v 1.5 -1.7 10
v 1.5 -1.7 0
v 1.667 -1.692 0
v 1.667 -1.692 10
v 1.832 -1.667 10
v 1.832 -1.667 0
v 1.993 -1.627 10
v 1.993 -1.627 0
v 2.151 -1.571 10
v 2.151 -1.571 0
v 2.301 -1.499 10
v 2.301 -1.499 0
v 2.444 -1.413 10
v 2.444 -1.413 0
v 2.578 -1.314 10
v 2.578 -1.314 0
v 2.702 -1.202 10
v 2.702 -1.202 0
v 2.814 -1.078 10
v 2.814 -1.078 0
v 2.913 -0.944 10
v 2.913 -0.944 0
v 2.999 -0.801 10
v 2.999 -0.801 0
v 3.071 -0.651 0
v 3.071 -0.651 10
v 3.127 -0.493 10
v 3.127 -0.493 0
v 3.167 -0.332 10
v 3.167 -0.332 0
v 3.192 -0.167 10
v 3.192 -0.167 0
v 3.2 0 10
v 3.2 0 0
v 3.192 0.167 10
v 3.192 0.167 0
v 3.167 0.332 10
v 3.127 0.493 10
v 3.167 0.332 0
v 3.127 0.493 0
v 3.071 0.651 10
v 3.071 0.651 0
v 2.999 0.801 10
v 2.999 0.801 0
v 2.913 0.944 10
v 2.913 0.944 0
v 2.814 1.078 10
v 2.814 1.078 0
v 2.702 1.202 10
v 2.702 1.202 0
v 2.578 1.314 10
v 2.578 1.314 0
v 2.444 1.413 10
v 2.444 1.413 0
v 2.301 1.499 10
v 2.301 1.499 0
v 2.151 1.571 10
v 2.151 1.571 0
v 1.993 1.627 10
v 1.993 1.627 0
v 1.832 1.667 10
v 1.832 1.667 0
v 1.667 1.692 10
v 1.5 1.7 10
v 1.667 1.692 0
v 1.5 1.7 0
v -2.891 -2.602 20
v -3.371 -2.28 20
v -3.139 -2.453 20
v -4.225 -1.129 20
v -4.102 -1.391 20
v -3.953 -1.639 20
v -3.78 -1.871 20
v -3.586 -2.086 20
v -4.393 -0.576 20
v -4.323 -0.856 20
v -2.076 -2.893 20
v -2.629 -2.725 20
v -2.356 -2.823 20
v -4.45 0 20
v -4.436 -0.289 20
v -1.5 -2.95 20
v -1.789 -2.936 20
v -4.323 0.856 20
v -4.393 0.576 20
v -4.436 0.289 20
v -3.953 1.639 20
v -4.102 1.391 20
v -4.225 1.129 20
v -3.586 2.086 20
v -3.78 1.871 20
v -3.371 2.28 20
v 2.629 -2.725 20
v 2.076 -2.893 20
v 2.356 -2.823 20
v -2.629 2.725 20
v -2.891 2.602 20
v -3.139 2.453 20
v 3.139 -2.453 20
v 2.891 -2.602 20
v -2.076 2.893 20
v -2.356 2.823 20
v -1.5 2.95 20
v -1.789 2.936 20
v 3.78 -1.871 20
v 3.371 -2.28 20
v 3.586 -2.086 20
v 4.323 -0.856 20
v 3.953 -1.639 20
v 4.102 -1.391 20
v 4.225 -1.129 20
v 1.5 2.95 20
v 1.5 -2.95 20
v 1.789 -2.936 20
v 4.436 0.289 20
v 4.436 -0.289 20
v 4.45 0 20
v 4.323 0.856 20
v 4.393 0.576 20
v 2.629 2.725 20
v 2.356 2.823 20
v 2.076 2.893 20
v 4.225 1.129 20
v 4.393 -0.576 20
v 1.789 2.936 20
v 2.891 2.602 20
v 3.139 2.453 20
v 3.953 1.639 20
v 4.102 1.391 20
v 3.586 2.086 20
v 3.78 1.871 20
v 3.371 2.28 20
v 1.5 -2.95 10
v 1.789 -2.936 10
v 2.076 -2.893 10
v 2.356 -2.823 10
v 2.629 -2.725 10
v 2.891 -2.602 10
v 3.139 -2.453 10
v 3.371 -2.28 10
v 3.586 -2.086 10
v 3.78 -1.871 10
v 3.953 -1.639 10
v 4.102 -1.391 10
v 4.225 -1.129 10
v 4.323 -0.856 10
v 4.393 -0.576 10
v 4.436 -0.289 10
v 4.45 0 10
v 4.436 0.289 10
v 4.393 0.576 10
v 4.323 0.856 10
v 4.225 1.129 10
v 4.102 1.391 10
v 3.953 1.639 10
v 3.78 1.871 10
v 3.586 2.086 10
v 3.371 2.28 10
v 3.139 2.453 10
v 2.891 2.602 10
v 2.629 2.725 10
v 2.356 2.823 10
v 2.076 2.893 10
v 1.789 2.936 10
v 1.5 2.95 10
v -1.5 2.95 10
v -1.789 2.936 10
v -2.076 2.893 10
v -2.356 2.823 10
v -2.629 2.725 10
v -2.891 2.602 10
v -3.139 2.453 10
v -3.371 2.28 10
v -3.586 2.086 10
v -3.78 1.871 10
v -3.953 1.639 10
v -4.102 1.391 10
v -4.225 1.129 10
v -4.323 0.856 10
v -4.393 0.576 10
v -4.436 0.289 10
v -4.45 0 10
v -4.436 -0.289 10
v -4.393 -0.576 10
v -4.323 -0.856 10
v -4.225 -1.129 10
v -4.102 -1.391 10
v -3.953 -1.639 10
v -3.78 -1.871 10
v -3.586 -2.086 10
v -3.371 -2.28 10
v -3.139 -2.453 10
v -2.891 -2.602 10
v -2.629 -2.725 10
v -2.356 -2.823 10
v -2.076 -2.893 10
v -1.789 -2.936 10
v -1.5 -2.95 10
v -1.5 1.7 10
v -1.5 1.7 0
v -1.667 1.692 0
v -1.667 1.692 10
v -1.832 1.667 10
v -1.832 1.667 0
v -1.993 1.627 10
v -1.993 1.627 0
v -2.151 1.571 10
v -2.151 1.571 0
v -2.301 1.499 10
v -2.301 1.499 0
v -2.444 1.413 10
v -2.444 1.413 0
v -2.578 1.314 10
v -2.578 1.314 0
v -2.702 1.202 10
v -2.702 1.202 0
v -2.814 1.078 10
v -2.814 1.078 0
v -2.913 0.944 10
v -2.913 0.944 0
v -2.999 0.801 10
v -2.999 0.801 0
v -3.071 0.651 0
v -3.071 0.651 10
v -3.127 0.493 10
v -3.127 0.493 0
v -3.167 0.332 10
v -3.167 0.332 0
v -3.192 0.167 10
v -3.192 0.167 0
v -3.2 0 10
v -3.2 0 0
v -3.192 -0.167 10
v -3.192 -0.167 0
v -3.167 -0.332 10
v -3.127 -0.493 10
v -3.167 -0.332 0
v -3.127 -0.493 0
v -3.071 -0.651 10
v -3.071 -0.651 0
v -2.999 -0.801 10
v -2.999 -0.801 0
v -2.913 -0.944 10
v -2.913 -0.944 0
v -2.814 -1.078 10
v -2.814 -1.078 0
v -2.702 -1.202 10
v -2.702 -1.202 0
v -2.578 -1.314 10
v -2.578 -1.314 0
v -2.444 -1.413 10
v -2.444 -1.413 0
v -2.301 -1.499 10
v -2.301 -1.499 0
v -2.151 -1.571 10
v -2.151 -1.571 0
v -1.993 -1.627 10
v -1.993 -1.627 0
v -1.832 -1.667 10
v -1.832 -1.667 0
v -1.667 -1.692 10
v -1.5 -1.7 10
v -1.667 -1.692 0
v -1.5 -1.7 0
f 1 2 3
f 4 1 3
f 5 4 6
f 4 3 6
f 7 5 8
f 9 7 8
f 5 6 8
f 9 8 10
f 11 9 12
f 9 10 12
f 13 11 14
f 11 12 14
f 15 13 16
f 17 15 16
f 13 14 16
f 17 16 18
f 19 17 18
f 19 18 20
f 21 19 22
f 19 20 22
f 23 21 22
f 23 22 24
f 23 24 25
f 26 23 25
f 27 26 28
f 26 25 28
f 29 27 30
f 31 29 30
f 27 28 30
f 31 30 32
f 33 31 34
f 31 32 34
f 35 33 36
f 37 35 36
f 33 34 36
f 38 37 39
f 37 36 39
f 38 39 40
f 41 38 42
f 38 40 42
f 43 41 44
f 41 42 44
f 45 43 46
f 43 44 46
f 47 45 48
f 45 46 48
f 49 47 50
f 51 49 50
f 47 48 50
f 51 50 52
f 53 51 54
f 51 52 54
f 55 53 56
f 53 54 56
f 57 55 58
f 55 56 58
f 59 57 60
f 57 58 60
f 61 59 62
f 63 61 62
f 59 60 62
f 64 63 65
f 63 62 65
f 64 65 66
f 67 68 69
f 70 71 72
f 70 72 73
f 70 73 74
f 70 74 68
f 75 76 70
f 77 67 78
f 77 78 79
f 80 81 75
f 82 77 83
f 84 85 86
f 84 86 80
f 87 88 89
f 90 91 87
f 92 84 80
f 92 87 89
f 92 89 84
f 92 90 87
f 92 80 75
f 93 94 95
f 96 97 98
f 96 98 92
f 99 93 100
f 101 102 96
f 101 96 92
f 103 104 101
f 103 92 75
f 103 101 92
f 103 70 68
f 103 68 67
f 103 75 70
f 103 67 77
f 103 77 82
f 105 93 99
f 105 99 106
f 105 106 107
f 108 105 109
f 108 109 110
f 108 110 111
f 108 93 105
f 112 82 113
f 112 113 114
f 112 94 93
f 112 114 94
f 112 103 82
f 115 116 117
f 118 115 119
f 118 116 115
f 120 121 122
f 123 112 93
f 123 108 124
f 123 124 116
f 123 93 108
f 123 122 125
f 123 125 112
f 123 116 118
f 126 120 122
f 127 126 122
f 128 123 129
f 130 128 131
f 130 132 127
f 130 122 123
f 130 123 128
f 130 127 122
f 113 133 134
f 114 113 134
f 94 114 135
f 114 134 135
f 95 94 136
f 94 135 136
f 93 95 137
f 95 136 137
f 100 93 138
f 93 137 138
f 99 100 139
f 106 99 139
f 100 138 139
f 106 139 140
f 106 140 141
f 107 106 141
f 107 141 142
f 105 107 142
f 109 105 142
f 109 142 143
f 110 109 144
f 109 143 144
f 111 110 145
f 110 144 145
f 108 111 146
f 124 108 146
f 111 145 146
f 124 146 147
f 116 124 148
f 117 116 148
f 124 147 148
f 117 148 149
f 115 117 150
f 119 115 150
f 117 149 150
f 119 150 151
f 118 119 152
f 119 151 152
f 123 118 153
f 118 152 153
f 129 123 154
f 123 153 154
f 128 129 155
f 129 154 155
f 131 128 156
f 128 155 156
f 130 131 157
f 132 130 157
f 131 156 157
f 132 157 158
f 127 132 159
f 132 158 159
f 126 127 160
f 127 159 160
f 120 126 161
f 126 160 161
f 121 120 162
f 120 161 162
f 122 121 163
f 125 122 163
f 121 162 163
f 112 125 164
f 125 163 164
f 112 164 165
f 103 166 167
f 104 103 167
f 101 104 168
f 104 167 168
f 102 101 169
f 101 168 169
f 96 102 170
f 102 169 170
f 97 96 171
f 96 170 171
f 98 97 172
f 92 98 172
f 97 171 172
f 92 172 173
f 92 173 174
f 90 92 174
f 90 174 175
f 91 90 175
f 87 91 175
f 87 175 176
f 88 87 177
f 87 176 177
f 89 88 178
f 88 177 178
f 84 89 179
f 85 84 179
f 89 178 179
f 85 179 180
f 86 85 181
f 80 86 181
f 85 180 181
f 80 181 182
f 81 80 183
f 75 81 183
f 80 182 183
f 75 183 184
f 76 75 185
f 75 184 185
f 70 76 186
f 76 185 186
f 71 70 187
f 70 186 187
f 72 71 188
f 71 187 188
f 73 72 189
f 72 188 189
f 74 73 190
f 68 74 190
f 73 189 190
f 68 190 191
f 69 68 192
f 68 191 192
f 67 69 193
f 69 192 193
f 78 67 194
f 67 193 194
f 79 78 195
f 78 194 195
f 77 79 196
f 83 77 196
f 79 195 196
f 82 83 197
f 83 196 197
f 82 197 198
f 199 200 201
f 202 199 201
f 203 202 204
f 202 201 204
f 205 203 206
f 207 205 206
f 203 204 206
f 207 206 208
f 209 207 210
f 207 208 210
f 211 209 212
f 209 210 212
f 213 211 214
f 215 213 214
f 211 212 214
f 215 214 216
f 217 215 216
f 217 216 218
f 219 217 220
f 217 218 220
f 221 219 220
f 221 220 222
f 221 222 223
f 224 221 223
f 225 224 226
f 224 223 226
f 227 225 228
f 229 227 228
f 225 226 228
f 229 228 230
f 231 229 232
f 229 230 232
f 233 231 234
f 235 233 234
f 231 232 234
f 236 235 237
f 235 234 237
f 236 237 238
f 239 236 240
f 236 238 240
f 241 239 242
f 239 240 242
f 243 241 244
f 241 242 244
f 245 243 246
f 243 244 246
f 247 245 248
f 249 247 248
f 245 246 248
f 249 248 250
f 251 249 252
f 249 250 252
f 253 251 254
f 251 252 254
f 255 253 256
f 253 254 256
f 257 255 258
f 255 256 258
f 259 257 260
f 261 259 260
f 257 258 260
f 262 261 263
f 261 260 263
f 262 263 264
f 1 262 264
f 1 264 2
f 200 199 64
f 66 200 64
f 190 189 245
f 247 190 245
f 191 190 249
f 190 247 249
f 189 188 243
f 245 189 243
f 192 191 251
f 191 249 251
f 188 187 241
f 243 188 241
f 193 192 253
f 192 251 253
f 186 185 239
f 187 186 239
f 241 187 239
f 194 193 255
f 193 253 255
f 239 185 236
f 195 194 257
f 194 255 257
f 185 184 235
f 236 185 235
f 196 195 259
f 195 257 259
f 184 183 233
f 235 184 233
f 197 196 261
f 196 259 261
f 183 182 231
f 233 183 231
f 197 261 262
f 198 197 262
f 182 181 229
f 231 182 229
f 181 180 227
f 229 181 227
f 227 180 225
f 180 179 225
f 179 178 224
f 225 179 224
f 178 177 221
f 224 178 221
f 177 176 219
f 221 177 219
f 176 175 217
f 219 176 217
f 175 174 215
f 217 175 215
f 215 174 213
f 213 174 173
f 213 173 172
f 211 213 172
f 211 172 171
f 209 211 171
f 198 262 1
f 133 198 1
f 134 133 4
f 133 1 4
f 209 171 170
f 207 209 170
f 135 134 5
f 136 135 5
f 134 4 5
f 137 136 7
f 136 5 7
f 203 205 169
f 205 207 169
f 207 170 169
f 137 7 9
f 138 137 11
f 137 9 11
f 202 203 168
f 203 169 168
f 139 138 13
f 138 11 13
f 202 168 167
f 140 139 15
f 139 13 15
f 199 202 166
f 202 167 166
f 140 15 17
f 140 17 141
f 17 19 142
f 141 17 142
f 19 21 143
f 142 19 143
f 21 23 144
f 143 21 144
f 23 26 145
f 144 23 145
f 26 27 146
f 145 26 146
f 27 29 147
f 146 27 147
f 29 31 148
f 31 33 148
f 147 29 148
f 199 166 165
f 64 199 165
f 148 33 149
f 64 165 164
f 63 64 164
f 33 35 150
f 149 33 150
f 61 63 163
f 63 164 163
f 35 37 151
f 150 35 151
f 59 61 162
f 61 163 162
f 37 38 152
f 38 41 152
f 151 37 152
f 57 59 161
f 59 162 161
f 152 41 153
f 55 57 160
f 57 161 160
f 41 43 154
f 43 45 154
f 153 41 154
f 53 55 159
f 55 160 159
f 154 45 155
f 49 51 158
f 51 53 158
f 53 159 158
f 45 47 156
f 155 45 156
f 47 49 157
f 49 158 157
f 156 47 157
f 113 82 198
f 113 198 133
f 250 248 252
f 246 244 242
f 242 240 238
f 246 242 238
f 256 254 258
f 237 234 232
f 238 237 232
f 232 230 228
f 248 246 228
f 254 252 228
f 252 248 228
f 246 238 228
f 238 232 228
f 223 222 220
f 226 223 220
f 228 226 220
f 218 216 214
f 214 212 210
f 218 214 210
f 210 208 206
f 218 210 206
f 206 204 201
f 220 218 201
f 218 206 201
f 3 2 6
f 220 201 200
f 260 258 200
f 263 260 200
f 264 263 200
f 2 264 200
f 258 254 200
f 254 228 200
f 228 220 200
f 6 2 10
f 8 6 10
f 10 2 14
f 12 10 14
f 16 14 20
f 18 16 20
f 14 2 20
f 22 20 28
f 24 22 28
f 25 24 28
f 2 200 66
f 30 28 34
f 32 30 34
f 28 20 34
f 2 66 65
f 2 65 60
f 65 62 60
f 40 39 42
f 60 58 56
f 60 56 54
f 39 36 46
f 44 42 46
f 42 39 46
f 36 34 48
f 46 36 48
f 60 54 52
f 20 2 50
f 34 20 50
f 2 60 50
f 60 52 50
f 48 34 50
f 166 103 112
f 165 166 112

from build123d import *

# Parameters (mm, degrees)
PAD006_DEPTH = 10
PAD007_DEPTH = 10


with BuildPart() as clone_of_m3boltslider003:
    # Sketch009 → Pad006 (new body)
    with BuildSketch(Plane.XY):
        with BuildLine():
            ThreePointArc((-1.5, 1.7), (-3.2, 0), (-1.5, -1.7))
            Line((-1.5, -1.7), (1.5, -1.7))
            ThreePointArc((1.5, -1.7), (3.2, 0), (1.5, 1.7))
            Line((-1.5, 1.7), (1.5, 1.7))
        make_face()
    extrude(amount=PAD006_DEPTH)


with BuildPart() as m3boldsliderwithhead:
    # Sketch010 → Pad007 (new body)
    with BuildSketch(Plane.XY.offset(10)):
        with BuildLine():
            ThreePointArc((-1.5, 2.95), (-4.45, 0), (-1.5, -2.95))
            Line((-1.5, -2.95), (1.5, -2.95))
            ThreePointArc((1.5, -2.95), (4.45, 0), (1.5, 2.95))
            Line((-1.5, 2.95), (1.5, 2.95))
        make_face()
    extrude(amount=PAD007_DEPTH)

    # Fusion015: union Clone of M3BoltSlider003
    add(clone_of_m3boltslider003.part)


solid = m3boldsliderwithhead.part
